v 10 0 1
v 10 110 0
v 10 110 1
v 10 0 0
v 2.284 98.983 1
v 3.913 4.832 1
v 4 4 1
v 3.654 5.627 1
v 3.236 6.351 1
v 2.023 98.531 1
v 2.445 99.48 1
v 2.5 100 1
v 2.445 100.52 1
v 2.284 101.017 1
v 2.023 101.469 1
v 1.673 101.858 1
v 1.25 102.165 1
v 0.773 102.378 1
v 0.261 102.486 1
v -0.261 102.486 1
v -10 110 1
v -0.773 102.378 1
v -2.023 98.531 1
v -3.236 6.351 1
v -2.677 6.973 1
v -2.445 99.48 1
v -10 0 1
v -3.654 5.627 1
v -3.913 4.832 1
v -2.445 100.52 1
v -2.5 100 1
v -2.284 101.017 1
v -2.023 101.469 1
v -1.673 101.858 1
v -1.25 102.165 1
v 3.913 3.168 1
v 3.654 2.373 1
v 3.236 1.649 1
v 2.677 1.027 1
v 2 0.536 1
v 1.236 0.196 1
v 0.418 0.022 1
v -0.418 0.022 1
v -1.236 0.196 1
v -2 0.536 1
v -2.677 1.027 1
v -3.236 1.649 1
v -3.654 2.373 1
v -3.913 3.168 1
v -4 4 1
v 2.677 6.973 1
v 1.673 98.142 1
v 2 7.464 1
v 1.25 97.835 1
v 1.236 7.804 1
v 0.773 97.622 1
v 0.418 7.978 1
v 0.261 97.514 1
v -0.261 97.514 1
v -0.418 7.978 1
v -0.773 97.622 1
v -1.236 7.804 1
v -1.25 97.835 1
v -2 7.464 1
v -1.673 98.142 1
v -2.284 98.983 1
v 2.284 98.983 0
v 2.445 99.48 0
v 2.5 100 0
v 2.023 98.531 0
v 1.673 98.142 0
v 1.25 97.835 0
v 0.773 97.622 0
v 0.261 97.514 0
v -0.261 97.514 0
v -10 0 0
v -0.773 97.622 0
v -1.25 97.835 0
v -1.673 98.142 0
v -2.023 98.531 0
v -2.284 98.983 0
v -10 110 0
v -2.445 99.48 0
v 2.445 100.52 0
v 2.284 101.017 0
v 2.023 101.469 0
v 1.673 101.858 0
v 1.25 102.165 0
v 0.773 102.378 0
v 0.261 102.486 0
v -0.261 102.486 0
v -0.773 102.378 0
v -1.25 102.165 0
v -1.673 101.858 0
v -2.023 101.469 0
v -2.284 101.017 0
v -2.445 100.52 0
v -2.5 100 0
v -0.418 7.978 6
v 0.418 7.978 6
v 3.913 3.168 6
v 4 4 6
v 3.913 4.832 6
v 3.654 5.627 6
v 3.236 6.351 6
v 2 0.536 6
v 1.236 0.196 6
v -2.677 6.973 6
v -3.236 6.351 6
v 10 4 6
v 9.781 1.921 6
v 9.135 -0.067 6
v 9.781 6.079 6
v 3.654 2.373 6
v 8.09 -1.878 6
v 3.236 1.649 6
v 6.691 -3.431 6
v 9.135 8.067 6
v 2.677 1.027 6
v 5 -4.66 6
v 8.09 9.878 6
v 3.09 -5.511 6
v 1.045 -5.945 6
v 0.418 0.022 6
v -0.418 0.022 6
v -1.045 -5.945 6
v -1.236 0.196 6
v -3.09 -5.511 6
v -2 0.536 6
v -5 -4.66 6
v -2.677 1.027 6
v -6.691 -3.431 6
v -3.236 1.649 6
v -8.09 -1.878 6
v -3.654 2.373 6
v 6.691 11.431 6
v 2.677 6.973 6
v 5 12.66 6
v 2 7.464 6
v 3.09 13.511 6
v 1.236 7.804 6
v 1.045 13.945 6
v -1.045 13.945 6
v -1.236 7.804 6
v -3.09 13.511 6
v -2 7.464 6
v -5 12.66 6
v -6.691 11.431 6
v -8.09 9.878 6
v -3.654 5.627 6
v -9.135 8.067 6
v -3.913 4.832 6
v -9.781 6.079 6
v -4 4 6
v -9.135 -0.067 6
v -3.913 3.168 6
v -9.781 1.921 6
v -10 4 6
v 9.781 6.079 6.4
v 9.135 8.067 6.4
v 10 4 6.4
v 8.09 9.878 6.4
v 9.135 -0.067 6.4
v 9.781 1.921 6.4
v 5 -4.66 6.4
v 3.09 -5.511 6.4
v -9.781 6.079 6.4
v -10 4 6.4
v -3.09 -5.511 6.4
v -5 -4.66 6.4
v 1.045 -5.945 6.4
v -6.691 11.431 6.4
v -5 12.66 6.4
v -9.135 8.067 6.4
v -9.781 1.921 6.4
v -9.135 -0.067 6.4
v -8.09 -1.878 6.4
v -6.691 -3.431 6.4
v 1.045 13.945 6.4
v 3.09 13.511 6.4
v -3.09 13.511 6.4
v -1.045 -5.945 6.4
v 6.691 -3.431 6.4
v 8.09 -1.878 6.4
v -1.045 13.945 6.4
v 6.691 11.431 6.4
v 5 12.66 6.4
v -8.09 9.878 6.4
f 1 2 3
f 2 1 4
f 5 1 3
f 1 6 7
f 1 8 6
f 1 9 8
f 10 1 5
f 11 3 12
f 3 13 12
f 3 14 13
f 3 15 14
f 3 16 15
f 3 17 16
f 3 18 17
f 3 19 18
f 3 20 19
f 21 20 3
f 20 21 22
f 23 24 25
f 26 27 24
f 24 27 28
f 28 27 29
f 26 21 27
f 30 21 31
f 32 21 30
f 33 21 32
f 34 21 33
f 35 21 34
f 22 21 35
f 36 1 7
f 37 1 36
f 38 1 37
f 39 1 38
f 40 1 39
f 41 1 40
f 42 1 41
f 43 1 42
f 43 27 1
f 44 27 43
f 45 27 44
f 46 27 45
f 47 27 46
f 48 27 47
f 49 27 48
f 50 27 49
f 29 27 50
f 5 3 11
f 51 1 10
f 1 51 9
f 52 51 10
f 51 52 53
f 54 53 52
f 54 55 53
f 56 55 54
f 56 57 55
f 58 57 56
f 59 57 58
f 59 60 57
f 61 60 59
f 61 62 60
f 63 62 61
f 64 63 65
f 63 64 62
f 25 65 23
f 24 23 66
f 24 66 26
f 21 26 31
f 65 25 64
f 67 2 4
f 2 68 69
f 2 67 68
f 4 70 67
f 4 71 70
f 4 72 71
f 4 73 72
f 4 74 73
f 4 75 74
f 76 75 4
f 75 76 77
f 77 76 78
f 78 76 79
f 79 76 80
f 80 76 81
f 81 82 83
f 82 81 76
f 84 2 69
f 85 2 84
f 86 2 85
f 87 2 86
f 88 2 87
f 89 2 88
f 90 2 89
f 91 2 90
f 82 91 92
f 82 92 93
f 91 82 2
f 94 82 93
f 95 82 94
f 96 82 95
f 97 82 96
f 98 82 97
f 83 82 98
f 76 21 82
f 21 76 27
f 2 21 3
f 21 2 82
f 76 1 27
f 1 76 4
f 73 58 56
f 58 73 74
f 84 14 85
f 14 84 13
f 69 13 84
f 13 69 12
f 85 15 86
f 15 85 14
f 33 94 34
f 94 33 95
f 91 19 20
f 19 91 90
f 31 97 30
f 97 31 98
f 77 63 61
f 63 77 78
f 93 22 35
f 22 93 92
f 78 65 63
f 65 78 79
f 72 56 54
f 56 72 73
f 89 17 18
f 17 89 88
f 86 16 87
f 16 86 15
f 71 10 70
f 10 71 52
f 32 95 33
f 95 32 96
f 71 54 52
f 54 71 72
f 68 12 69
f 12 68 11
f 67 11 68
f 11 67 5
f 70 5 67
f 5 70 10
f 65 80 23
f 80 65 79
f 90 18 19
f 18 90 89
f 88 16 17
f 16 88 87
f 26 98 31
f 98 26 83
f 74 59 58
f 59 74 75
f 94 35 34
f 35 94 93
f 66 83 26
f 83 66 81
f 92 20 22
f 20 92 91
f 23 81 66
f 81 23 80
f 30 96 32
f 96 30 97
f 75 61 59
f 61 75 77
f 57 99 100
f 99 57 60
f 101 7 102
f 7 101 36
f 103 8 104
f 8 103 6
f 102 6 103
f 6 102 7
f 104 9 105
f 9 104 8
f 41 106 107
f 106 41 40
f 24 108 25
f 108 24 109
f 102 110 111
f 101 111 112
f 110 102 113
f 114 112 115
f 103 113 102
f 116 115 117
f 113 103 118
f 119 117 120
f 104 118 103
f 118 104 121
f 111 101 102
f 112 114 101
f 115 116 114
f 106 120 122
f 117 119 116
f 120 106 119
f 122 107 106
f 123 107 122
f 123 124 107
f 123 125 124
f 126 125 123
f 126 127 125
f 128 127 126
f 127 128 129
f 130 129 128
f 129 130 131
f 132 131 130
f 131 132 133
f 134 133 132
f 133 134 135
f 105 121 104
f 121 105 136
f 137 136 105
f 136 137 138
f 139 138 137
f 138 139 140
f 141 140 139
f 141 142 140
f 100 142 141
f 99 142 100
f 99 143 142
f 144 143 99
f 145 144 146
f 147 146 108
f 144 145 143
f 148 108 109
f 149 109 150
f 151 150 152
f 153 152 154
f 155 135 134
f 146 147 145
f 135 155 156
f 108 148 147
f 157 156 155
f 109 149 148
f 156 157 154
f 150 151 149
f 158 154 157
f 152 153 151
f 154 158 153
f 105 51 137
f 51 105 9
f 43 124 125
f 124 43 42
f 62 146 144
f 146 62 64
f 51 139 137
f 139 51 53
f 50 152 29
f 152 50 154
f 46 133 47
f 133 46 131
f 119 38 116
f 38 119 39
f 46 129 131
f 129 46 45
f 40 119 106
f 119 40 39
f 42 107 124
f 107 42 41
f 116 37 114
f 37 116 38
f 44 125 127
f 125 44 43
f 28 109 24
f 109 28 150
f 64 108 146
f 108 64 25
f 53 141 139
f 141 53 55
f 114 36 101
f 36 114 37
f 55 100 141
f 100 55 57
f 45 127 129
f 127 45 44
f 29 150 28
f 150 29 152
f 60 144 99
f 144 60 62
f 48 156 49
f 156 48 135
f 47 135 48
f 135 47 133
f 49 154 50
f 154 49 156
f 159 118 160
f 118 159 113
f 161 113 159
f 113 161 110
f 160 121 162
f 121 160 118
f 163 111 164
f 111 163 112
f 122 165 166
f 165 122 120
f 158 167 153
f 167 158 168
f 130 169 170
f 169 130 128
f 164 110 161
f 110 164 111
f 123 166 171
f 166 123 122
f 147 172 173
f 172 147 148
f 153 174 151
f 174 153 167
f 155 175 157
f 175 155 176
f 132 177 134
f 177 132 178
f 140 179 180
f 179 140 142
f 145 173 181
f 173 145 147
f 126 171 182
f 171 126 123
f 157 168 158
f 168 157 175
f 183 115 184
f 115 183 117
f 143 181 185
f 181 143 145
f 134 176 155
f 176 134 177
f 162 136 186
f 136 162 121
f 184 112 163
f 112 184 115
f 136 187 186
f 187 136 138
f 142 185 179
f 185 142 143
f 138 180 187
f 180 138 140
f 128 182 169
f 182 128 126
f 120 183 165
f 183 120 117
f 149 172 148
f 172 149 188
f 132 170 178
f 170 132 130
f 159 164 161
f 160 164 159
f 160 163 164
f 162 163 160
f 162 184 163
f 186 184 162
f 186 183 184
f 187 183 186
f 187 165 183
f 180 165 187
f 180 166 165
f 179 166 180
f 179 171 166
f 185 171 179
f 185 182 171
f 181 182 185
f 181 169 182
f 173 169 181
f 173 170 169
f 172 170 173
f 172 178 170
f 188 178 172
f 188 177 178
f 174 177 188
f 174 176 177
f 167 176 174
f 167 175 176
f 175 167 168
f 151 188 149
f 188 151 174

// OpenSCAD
// Centered Cube Module
// Creates a cube that is centered in x axis but not in y and z axes
// Parameters:
// - size: [width, depth, height] of the cube or single value for a cube with equal dimensions

screw_hole_diameter = 5;
hook_length = 110;
hook_width = 20;
hook_height = 1;
hook_small_diameter = 8;
hook_small_length = 5;
hook_big_diameter = 20;
hook_big_length = 0.4;

module c_cube(size) {
    // Handle both array and single value inputs
    width = is_list(size) ? size[0] : size;
    depth = is_list(size) ? size[1] : size;
    height = is_list(size) ? size[2] : size;
    
    // Translate only in x direction to center on that axis
    translate([-width/2, 0, 0])
        cube([width, depth, height]);
}

// Hook

module hook() {
    difference() {
        c_cube([hook_width, hook_length, hook_height]);
        // Add a circular hole with 5mm diameter
        translate([0, hook_length-10, 0])
            cylinder(h=1, d=screw_hole_diameter, $fn=30, center=false);
    }

    translate([0, hook_small_diameter/2, hook_height])
        cylinder(h=hook_small_length, d=hook_small_diameter, $fn=30, center=false);
    translate([0, hook_small_diameter/2, hook_height+hook_small_length])
        cylinder(h=hook_big_length, d=hook_big_diameter, $fn=30, center=false);
}

hook();
